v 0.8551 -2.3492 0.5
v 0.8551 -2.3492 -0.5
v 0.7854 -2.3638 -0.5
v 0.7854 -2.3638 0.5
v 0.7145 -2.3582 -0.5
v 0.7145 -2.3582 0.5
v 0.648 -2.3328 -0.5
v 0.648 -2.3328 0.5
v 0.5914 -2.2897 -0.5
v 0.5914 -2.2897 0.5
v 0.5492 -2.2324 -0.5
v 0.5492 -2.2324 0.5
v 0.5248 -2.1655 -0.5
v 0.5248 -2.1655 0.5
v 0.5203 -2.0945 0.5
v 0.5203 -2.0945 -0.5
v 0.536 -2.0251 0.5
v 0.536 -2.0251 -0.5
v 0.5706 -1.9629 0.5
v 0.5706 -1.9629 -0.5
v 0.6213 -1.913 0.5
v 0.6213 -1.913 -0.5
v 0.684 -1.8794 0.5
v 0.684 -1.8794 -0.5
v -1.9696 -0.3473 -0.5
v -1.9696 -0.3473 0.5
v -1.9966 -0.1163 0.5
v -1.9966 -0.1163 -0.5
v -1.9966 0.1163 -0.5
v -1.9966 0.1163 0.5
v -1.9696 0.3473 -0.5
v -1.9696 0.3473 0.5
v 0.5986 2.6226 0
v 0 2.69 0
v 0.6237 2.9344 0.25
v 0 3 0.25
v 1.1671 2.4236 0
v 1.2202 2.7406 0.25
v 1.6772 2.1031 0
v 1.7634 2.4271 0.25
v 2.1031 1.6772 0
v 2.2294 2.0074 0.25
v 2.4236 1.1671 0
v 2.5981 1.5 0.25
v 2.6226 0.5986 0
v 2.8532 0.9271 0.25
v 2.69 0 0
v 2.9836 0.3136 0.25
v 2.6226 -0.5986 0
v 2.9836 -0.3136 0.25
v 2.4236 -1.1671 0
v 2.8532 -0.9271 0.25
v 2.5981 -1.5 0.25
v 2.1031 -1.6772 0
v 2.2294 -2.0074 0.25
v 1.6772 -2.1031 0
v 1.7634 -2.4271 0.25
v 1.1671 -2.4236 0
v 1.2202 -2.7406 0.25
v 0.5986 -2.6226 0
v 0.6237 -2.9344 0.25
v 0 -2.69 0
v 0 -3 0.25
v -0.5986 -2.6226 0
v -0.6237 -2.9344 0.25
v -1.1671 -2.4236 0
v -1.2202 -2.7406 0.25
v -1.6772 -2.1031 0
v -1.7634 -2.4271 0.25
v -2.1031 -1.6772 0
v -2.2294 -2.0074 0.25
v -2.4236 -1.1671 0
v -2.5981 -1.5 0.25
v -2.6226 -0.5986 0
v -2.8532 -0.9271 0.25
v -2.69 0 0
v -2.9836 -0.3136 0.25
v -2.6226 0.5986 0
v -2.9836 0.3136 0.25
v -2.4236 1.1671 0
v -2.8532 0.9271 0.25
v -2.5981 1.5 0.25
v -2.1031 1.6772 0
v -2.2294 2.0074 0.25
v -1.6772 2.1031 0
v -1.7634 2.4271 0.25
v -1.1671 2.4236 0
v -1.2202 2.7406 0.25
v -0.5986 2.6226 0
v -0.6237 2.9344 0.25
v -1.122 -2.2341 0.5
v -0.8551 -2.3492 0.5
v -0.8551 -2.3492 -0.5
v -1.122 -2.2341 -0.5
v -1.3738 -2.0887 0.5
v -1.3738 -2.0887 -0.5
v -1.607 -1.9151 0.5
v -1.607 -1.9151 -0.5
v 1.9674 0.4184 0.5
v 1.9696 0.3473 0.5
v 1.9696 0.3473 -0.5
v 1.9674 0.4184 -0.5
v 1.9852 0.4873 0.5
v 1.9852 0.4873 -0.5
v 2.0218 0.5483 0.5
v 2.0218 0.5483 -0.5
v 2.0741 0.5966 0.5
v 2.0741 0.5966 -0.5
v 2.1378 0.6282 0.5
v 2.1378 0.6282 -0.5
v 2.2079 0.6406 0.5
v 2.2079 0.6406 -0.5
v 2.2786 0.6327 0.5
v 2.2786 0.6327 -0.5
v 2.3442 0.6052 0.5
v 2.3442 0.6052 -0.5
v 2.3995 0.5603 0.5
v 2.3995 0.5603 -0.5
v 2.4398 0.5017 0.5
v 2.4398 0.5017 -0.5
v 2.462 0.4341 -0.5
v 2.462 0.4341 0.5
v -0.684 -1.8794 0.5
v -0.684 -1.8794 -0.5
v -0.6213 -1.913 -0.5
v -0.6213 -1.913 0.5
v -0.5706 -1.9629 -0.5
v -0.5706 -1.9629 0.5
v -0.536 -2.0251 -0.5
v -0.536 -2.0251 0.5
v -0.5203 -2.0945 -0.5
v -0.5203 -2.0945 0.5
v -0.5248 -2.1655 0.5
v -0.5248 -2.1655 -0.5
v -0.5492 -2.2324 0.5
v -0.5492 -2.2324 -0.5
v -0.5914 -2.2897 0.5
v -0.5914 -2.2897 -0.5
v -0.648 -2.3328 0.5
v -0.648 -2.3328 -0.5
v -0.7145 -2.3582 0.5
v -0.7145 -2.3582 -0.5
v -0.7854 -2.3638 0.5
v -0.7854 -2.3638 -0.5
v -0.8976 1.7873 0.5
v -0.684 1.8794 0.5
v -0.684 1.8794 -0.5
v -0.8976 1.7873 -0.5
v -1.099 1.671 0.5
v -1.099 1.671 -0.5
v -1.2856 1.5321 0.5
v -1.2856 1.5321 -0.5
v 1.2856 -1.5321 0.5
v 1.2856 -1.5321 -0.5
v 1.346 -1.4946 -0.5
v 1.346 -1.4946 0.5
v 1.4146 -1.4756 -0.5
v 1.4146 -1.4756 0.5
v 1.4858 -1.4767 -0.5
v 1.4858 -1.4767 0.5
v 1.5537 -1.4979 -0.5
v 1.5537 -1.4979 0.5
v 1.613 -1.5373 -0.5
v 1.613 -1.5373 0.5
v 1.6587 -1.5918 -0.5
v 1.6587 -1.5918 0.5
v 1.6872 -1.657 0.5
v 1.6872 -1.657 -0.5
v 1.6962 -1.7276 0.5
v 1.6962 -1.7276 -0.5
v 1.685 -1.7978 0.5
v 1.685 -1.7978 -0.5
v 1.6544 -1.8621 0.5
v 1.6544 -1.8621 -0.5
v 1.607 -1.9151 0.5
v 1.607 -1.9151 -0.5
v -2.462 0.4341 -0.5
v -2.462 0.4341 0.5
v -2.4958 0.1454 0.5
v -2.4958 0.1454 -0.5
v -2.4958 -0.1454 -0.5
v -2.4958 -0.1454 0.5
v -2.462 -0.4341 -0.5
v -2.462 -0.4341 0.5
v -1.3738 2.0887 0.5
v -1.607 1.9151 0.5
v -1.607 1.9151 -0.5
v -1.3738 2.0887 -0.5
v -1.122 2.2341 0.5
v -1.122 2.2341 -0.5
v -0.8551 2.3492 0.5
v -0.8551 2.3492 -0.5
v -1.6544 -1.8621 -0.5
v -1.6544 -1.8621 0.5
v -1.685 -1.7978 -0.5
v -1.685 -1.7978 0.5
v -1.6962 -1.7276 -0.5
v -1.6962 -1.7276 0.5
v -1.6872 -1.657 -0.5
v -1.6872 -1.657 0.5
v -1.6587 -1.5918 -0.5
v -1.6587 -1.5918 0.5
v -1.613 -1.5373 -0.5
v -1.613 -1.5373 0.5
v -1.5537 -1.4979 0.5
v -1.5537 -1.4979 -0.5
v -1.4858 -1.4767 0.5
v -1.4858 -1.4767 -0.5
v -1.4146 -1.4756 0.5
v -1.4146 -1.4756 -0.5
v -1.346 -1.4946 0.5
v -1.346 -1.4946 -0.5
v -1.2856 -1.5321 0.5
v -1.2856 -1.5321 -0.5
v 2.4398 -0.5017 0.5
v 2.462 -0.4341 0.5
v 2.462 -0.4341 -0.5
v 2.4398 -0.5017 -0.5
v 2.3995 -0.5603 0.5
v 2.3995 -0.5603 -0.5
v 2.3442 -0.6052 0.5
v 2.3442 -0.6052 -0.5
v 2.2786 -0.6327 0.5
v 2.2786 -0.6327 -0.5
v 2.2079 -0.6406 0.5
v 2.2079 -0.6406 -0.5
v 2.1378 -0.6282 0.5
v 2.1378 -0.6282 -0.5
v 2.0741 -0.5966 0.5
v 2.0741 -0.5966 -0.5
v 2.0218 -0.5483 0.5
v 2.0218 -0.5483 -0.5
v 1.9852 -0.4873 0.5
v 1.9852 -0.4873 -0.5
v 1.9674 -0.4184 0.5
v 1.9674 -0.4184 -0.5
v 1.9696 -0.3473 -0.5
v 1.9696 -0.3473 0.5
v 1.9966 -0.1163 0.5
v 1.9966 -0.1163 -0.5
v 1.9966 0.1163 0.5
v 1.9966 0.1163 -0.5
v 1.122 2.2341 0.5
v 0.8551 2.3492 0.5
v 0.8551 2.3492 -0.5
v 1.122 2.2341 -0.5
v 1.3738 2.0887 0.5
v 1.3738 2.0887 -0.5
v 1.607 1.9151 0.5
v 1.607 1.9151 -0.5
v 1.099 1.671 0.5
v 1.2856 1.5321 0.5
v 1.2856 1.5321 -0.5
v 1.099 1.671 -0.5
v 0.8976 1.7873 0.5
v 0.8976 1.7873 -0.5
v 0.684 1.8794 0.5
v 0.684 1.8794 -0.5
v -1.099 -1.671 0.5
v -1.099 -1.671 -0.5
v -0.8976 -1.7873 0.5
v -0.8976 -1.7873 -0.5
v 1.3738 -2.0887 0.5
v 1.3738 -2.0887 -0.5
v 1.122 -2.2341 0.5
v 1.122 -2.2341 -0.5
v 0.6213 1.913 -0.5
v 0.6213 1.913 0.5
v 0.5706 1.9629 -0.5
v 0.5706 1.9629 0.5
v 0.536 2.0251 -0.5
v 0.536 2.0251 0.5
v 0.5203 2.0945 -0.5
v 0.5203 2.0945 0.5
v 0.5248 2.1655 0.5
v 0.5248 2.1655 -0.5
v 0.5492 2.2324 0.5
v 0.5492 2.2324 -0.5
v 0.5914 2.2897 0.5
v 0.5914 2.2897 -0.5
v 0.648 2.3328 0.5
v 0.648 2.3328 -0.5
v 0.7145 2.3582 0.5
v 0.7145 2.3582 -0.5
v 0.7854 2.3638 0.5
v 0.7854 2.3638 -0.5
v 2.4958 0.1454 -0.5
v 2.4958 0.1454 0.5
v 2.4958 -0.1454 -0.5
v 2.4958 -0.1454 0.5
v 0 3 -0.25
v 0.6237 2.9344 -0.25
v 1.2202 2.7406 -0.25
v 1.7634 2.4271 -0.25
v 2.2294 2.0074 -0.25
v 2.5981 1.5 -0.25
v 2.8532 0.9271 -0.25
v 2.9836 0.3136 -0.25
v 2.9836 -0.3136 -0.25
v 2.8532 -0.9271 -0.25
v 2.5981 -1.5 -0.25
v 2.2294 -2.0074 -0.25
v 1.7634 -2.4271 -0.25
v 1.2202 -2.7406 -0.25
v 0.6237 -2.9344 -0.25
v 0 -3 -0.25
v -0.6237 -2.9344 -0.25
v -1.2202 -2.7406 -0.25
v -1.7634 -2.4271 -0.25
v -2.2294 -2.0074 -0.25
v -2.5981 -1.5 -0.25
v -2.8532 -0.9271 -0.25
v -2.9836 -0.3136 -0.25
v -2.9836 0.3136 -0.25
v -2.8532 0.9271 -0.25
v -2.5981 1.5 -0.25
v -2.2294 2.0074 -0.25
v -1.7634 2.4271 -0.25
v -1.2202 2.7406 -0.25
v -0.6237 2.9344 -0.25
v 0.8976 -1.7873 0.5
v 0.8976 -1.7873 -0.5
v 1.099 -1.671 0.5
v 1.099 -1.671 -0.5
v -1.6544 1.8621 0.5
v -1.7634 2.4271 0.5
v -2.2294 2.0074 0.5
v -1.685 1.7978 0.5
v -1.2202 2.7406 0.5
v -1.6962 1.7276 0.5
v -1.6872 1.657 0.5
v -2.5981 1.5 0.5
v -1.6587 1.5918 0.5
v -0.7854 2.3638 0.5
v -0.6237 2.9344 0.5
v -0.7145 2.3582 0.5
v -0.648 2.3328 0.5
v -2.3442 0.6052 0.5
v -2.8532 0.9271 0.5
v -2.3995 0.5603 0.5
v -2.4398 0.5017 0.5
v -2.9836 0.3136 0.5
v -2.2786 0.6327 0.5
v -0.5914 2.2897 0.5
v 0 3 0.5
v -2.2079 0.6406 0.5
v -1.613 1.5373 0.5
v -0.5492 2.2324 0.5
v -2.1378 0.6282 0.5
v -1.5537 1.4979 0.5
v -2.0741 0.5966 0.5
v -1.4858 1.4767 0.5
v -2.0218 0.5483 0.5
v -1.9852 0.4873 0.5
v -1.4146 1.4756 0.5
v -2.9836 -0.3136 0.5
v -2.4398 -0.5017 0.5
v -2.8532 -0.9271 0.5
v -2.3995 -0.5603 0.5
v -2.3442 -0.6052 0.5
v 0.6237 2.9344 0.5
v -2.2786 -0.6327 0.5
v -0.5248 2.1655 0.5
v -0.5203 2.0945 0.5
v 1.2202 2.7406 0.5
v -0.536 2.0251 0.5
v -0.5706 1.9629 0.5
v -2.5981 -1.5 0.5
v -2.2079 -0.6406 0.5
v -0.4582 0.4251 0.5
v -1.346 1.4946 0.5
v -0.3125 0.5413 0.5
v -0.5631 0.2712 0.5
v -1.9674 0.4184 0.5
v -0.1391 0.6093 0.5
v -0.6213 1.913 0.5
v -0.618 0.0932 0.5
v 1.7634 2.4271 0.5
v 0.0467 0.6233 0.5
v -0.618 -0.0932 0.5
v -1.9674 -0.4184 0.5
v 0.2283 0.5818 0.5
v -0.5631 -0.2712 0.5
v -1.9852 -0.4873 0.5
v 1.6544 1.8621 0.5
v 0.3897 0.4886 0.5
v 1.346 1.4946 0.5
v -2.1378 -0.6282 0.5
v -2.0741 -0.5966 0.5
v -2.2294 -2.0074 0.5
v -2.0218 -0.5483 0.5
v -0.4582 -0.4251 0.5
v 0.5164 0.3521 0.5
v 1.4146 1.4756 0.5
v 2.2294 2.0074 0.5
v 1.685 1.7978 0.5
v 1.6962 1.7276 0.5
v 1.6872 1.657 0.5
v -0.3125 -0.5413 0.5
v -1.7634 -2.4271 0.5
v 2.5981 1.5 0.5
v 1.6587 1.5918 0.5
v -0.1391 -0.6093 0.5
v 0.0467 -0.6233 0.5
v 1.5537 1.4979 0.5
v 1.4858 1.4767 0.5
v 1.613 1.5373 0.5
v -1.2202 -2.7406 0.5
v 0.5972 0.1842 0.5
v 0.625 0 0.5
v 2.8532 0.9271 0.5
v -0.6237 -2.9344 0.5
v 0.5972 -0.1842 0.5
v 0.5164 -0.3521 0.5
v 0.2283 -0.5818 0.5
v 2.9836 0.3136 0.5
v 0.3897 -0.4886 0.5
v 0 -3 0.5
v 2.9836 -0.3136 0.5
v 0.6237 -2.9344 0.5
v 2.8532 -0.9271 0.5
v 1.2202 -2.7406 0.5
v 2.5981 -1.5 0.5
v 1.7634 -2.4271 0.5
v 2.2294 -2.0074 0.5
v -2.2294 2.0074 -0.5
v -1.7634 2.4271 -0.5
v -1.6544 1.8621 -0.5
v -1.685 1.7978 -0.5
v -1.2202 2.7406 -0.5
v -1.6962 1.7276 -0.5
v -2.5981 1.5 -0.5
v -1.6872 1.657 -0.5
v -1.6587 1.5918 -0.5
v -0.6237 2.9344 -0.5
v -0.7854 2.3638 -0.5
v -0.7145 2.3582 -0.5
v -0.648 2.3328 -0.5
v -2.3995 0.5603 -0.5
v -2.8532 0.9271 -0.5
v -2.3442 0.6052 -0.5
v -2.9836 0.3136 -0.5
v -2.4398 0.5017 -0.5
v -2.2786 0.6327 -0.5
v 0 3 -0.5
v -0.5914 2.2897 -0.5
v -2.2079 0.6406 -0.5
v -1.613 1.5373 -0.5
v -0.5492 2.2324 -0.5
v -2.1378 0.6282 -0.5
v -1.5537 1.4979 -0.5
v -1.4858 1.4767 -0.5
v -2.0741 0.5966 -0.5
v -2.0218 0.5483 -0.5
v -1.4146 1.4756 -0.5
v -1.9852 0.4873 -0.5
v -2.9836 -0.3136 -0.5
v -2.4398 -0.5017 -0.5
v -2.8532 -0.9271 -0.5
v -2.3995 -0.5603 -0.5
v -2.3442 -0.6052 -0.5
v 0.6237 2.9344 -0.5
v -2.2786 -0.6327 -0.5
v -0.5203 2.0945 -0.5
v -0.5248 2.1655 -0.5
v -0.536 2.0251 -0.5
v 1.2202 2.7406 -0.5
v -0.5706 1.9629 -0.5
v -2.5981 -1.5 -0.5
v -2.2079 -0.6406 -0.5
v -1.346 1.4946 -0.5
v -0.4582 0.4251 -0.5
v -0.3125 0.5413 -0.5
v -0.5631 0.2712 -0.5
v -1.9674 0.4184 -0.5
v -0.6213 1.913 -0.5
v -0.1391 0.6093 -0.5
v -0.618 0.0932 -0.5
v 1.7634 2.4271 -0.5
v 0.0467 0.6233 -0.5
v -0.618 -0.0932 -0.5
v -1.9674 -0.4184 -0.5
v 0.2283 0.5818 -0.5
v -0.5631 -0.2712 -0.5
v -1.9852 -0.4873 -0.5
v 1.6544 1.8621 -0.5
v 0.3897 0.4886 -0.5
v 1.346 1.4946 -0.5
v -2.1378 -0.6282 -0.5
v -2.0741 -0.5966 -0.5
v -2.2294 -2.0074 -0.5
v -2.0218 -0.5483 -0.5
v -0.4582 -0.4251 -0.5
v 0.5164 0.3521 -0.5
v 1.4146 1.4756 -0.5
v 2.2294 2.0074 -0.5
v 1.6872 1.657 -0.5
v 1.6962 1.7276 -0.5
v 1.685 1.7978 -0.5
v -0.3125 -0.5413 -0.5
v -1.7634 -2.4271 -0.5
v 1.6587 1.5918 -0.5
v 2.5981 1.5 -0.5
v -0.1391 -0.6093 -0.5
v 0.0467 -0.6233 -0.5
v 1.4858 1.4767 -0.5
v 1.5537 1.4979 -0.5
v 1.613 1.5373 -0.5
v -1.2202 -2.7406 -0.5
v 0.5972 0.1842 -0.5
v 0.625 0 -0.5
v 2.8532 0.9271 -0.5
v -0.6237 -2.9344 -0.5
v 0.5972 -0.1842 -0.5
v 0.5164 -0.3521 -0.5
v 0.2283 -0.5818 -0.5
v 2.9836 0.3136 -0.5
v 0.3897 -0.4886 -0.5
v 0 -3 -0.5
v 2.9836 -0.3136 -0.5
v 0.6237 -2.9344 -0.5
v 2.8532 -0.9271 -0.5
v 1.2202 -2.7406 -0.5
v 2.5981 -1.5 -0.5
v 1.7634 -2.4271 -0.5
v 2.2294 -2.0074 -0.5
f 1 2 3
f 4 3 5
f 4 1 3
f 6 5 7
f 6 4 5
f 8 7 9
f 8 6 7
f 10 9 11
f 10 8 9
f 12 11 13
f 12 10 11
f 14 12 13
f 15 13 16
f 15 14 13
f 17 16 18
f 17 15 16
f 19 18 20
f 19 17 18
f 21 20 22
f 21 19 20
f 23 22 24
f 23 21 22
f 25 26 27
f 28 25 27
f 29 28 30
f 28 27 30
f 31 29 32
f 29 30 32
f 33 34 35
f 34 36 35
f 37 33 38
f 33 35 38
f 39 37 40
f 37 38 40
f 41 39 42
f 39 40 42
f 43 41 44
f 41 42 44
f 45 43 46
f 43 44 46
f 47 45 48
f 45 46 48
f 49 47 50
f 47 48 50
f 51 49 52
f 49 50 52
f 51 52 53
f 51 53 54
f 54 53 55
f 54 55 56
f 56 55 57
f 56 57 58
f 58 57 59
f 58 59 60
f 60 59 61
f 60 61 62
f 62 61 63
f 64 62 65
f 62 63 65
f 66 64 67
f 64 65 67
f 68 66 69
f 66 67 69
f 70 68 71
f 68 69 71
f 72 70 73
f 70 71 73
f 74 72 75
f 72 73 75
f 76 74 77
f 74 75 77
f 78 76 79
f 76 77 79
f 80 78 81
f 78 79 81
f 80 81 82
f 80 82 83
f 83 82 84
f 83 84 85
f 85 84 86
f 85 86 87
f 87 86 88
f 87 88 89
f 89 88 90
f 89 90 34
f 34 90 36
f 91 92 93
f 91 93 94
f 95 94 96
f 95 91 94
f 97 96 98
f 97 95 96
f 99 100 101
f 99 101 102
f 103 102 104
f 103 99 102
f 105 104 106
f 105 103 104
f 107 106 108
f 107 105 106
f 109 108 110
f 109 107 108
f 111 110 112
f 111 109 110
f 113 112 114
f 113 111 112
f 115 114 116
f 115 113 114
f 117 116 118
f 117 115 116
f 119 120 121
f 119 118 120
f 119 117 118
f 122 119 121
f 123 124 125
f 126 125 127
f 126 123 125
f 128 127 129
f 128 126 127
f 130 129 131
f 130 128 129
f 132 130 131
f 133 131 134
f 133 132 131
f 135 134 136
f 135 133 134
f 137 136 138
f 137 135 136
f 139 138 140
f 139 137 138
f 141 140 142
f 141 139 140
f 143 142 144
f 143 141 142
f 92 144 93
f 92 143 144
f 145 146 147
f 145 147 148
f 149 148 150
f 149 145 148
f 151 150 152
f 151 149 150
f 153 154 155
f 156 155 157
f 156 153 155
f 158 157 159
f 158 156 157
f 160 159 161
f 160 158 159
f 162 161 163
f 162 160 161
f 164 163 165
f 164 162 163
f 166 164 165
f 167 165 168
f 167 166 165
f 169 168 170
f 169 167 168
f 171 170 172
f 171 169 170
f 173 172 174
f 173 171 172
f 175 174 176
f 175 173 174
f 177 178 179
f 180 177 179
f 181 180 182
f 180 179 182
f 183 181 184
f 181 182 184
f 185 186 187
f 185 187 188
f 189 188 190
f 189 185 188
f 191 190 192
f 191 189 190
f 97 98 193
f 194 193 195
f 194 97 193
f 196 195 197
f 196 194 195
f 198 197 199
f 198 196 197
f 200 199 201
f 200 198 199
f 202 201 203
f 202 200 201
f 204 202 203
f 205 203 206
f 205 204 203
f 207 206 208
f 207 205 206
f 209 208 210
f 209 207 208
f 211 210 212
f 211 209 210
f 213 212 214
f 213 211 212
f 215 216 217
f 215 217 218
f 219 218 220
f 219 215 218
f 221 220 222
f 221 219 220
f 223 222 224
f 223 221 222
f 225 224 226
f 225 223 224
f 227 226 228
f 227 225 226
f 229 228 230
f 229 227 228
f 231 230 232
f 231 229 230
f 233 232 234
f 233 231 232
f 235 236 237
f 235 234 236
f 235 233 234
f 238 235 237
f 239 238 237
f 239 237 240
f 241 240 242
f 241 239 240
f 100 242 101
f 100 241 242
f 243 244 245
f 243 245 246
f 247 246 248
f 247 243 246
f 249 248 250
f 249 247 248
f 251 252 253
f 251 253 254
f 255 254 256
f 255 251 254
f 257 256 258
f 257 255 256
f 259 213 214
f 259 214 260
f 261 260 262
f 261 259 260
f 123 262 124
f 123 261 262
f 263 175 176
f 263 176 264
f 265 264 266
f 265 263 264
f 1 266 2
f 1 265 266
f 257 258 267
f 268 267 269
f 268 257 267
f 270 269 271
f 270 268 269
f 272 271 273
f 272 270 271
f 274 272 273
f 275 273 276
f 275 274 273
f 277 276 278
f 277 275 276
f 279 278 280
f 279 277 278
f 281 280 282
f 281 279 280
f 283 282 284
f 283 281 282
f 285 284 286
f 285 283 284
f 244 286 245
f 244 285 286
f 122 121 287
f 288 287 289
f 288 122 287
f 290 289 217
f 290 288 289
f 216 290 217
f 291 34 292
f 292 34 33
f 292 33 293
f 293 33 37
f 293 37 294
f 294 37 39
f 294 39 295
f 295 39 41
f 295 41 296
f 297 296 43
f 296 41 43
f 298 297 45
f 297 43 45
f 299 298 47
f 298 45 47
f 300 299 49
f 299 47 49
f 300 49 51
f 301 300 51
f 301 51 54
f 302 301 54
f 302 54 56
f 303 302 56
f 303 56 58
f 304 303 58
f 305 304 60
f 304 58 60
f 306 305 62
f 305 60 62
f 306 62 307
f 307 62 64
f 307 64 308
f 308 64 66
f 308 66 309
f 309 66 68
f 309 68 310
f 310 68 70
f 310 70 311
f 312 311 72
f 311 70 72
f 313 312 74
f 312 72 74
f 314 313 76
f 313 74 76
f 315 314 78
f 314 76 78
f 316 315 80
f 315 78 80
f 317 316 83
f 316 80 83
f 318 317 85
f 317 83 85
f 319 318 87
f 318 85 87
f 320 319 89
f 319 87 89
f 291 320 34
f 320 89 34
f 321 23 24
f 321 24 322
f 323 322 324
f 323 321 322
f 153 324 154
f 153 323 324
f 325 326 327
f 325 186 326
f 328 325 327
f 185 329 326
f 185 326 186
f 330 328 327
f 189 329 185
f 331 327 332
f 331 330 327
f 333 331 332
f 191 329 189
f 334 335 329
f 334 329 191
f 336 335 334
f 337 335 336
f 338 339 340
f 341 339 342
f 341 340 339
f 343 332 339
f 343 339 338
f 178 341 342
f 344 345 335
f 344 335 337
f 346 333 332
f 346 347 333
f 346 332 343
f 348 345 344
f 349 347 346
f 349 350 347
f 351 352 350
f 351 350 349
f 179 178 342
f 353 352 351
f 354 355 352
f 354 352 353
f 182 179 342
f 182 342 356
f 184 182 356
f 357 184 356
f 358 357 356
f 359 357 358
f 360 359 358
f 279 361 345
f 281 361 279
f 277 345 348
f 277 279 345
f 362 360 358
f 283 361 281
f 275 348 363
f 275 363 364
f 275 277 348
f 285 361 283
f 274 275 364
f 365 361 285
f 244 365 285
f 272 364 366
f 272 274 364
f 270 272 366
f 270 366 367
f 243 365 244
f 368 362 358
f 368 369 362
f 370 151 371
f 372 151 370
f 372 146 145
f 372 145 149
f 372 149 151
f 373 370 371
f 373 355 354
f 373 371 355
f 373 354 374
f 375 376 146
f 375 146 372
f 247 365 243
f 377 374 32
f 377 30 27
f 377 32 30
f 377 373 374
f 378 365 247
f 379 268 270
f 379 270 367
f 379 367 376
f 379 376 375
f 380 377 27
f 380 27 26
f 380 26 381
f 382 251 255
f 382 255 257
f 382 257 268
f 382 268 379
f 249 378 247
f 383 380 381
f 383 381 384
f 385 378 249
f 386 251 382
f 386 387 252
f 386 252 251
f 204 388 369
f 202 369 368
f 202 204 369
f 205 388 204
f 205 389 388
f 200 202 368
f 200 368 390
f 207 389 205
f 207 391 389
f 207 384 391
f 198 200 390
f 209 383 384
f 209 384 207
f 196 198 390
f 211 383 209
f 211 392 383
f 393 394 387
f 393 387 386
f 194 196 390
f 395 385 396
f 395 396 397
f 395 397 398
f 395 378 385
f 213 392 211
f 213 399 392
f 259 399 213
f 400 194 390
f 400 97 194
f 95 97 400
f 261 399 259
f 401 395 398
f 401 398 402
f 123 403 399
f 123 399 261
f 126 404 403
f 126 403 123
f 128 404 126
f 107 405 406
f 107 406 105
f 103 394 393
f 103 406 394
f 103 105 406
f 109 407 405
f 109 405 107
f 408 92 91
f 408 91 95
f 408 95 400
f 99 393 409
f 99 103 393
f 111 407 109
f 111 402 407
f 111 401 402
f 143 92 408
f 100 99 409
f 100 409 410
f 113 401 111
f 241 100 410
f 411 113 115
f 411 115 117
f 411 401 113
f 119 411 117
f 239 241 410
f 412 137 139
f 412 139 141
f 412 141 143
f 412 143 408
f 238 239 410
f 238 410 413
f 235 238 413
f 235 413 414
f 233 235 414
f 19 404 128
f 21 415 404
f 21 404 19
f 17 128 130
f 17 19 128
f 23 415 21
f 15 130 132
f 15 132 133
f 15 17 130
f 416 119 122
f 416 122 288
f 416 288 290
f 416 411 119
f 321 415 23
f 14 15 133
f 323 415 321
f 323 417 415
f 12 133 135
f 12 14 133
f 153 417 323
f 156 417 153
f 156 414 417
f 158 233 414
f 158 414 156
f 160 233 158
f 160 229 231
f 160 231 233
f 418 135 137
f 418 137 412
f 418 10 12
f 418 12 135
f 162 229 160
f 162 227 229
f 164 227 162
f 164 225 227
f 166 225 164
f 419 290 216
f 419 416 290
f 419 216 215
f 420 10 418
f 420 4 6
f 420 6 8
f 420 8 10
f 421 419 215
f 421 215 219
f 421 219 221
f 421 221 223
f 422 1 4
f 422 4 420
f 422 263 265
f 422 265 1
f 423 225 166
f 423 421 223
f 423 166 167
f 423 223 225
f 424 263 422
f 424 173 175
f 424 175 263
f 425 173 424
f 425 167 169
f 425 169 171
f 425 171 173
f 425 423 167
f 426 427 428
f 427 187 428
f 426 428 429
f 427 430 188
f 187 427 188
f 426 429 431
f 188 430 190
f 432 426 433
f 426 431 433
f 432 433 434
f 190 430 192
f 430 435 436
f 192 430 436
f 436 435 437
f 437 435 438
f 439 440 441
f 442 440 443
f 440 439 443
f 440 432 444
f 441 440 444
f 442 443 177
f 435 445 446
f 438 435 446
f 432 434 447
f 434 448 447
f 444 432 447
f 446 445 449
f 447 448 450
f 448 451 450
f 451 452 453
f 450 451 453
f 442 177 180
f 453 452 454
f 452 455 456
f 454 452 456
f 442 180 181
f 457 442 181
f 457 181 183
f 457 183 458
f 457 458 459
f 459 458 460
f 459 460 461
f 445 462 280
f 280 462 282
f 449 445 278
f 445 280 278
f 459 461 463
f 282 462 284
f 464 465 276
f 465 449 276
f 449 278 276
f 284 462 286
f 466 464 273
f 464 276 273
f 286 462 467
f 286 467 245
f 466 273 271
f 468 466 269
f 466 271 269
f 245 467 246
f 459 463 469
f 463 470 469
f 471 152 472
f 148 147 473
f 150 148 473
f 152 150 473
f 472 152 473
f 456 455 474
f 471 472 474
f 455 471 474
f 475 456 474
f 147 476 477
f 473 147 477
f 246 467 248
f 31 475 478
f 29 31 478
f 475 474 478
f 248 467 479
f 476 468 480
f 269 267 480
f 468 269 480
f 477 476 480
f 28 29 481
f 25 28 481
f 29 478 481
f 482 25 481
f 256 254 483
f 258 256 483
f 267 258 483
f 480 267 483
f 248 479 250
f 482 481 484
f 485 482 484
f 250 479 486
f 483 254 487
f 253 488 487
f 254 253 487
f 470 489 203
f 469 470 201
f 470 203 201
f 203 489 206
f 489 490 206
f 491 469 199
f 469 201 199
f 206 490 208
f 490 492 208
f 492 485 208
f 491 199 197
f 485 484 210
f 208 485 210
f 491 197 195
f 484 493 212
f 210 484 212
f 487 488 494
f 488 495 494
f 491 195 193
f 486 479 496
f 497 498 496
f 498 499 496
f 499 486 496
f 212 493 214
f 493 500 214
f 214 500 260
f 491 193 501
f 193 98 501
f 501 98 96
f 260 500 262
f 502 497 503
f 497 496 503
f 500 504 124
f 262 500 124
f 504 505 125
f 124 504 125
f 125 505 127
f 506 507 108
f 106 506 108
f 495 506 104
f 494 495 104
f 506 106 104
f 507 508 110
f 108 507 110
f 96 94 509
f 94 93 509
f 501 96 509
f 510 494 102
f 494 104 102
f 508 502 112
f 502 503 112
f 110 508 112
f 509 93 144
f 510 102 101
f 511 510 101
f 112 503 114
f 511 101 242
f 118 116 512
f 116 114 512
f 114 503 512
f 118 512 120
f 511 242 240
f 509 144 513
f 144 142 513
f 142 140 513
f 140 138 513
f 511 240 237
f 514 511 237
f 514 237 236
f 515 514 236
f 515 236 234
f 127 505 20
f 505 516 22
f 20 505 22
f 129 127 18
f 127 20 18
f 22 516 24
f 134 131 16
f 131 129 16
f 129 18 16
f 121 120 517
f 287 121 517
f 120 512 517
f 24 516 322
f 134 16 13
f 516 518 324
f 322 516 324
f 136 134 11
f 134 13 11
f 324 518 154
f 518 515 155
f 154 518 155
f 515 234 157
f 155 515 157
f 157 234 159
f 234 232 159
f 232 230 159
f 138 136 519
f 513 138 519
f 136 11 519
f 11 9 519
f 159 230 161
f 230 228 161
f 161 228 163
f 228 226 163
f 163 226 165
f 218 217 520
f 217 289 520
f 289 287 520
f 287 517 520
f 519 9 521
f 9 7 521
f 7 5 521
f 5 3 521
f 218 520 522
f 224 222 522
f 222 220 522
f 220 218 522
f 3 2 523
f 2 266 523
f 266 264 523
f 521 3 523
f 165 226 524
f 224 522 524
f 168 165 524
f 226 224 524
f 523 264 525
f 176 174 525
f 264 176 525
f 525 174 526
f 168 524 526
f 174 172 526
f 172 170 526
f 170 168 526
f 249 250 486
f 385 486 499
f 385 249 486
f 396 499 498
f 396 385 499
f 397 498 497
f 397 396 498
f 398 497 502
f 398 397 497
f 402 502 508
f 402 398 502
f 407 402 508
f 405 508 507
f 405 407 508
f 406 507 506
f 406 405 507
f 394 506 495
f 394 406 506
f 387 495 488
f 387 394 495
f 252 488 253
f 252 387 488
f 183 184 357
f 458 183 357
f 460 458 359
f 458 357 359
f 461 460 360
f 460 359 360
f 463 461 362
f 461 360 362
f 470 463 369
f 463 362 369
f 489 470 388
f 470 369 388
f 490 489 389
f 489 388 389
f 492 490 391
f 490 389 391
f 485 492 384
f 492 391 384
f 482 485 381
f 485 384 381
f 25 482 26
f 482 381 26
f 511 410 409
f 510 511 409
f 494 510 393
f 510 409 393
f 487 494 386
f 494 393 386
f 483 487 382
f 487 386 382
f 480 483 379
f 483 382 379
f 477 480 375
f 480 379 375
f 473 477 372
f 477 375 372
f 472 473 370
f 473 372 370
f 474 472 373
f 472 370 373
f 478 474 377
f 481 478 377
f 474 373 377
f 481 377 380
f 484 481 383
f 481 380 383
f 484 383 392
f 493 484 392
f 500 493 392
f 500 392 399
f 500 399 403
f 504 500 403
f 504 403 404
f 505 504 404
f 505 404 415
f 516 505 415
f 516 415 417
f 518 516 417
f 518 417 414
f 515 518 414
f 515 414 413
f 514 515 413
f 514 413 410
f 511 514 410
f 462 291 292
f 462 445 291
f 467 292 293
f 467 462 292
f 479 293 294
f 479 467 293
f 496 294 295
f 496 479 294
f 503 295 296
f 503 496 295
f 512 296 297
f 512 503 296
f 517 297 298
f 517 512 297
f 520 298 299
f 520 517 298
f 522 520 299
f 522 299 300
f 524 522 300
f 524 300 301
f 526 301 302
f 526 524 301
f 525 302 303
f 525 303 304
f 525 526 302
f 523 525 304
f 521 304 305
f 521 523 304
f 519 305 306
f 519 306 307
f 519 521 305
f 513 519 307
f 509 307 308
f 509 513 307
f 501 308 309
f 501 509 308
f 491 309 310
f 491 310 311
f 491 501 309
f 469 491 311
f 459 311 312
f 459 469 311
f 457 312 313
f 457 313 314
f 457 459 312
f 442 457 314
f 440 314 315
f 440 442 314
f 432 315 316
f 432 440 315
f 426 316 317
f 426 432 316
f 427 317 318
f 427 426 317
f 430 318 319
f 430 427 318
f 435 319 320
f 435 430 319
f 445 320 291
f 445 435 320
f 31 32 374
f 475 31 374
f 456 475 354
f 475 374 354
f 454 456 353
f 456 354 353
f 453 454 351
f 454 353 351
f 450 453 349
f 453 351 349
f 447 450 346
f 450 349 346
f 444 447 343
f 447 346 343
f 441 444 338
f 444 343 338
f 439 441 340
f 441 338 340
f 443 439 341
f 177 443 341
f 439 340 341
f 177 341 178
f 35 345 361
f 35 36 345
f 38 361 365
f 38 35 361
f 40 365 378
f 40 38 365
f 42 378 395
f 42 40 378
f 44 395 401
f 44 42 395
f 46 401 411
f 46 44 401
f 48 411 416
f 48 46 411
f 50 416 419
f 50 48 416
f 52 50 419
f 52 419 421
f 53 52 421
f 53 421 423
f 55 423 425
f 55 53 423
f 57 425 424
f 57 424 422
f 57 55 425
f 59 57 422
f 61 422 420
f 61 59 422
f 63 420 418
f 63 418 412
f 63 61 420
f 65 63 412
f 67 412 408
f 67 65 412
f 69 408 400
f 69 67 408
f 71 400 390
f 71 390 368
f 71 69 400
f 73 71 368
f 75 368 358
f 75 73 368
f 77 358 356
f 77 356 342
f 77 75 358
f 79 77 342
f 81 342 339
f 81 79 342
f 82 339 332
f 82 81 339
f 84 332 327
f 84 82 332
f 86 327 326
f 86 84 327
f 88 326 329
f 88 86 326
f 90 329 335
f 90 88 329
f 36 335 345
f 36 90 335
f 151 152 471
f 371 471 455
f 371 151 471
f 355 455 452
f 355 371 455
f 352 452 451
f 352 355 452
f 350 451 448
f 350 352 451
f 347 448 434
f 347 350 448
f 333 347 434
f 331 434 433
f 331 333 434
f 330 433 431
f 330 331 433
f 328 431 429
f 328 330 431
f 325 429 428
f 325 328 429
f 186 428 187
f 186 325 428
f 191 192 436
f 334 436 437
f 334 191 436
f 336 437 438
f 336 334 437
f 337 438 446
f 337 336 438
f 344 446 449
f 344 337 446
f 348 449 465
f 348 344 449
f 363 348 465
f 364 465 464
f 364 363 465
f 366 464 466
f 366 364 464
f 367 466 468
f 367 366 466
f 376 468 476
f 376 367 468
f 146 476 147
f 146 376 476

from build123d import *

# Parameters (mm, degrees)
SKETCH1_W          = 0.25
SKETCH1_H          = 3
SKETCH2_R          = 0.625
CUT_EXTRUDE1_DEPTH = 2


with BuildPart() as part:
    # Sketch1 → Revolve2 (revolve)
    with BuildSketch(Plane(origin=(0, 0, 0), x_dir=(0, 0, -1), z_dir=(1, 0, 0))):
        with Locations((-0.375, 1.5)):
            Rectangle(SKETCH1_W, SKETCH1_H)
        Polygon((0.25, 3), (0, 2.69), (-0.25, 3), (-0.25, 0), (0.25, 0), align=None)
        with Locations((0.375, 1.5)):
            Rectangle(SKETCH1_W, SKETCH1_H)
    revolve(axis=Axis((0, 0, 1.404515092), (0, 0, -1)))

    # Sketch2 → Cut-Extrude1 (cut, through all)
    with BuildSketch(Plane.XY.offset(0.5)):
        Circle(SKETCH2_R)
        with BuildLine():
            ThreePointArc((-2.462019383, 0.434120444), (-2.5, 0), (-2.462019383, -0.434120444))
            ThreePointArc((-2.462019383, -0.434120444), (-2.1724054, -0.636910338), (-1.969615506, -0.347296355))
            ThreePointArc((-1.969615506, -0.347296355), (-2, 0), (-1.969615506, 0.347296355))
            ThreePointArc((-1.969615506, 0.347296355), (-2.1724054, 0.636910338), (-2.462019383, 0.434120444))
        make_face()
        with BuildLine():
            ThreePointArc((-0.684040287, 1.879385242), (-1, 1.732050808), (-1.285575219, 1.532088886))
            ThreePointArc((-1.285575219, 1.532088886), (-1.637783233, 1.562903095), (-1.606969024, 1.915111108))
            ThreePointArc((-1.606969024, 1.915111108), (-1.25, 2.165063509), (-0.855050358, 2.349231552))
            ThreePointArc((-0.855050358, 2.349231552), (-0.534622167, 2.199813433), (-0.684040287, 1.879385242))
        make_face()
        with BuildLine():
            ThreePointArc((1.285575219, 1.532088886), (1, 1.732050808), (0.684040287, 1.879385242))
            ThreePointArc((0.684040287, 1.879385242), (0.534622167, 2.199813433), (0.855050358, 2.349231552))
            ThreePointArc((0.855050358, 2.349231552), (1.25, 2.165063509), (1.606969024, 1.915111108))
            ThreePointArc((1.606969024, 1.915111108), (1.637783233, 1.562903095), (1.285575219, 1.532088886))
        make_face()
        with BuildLine():
            ThreePointArc((1.969615506, -0.347296355), (2, 0), (1.969615506, 0.347296355))
            ThreePointArc((1.969615506, 0.347296355), (2.1724054, 0.636910338), (2.462019383, 0.434120444))
            ThreePointArc((2.462019383, 0.434120444), (2.5, 0), (2.462019383, -0.434120444))
            ThreePointArc((2.462019383, -0.434120444), (2.1724054, -0.636910338), (1.969615506, -0.347296355))
        make_face()
        with BuildLine():
            ThreePointArc((0.684040287, -1.879385242), (1, -1.732050808), (1.285575219, -1.532088886))
            ThreePointArc((1.285575219, -1.532088886), (1.637783233, -1.562903095), (1.606969024, -1.915111108))
            ThreePointArc((1.606969024, -1.915111108), (1.25, -2.165063509), (0.855050358, -2.349231552))
            ThreePointArc((0.855050358, -2.349231552), (0.534622167, -2.199813433), (0.684040287, -1.879385242))
        make_face()
        with BuildLine():
            ThreePointArc((-1.285575219, -1.532088886), (-1, -1.732050808), (-0.684040287, -1.879385242))
            ThreePointArc((-0.684040287, -1.879385242), (-0.534622167, -2.199813433), (-0.855050358, -2.349231552))
            ThreePointArc((-0.855050358, -2.349231552), (-1.25, -2.165063509), (-1.606969024, -1.915111108))
            ThreePointArc((-1.606969024, -1.915111108), (-1.637783233, -1.562903095), (-1.285575219, -1.532088886))
        make_face()
    extrude(amount=-CUT_EXTRUDE1_DEPTH, mode=Mode.SUBTRACT)


solid = part.part
